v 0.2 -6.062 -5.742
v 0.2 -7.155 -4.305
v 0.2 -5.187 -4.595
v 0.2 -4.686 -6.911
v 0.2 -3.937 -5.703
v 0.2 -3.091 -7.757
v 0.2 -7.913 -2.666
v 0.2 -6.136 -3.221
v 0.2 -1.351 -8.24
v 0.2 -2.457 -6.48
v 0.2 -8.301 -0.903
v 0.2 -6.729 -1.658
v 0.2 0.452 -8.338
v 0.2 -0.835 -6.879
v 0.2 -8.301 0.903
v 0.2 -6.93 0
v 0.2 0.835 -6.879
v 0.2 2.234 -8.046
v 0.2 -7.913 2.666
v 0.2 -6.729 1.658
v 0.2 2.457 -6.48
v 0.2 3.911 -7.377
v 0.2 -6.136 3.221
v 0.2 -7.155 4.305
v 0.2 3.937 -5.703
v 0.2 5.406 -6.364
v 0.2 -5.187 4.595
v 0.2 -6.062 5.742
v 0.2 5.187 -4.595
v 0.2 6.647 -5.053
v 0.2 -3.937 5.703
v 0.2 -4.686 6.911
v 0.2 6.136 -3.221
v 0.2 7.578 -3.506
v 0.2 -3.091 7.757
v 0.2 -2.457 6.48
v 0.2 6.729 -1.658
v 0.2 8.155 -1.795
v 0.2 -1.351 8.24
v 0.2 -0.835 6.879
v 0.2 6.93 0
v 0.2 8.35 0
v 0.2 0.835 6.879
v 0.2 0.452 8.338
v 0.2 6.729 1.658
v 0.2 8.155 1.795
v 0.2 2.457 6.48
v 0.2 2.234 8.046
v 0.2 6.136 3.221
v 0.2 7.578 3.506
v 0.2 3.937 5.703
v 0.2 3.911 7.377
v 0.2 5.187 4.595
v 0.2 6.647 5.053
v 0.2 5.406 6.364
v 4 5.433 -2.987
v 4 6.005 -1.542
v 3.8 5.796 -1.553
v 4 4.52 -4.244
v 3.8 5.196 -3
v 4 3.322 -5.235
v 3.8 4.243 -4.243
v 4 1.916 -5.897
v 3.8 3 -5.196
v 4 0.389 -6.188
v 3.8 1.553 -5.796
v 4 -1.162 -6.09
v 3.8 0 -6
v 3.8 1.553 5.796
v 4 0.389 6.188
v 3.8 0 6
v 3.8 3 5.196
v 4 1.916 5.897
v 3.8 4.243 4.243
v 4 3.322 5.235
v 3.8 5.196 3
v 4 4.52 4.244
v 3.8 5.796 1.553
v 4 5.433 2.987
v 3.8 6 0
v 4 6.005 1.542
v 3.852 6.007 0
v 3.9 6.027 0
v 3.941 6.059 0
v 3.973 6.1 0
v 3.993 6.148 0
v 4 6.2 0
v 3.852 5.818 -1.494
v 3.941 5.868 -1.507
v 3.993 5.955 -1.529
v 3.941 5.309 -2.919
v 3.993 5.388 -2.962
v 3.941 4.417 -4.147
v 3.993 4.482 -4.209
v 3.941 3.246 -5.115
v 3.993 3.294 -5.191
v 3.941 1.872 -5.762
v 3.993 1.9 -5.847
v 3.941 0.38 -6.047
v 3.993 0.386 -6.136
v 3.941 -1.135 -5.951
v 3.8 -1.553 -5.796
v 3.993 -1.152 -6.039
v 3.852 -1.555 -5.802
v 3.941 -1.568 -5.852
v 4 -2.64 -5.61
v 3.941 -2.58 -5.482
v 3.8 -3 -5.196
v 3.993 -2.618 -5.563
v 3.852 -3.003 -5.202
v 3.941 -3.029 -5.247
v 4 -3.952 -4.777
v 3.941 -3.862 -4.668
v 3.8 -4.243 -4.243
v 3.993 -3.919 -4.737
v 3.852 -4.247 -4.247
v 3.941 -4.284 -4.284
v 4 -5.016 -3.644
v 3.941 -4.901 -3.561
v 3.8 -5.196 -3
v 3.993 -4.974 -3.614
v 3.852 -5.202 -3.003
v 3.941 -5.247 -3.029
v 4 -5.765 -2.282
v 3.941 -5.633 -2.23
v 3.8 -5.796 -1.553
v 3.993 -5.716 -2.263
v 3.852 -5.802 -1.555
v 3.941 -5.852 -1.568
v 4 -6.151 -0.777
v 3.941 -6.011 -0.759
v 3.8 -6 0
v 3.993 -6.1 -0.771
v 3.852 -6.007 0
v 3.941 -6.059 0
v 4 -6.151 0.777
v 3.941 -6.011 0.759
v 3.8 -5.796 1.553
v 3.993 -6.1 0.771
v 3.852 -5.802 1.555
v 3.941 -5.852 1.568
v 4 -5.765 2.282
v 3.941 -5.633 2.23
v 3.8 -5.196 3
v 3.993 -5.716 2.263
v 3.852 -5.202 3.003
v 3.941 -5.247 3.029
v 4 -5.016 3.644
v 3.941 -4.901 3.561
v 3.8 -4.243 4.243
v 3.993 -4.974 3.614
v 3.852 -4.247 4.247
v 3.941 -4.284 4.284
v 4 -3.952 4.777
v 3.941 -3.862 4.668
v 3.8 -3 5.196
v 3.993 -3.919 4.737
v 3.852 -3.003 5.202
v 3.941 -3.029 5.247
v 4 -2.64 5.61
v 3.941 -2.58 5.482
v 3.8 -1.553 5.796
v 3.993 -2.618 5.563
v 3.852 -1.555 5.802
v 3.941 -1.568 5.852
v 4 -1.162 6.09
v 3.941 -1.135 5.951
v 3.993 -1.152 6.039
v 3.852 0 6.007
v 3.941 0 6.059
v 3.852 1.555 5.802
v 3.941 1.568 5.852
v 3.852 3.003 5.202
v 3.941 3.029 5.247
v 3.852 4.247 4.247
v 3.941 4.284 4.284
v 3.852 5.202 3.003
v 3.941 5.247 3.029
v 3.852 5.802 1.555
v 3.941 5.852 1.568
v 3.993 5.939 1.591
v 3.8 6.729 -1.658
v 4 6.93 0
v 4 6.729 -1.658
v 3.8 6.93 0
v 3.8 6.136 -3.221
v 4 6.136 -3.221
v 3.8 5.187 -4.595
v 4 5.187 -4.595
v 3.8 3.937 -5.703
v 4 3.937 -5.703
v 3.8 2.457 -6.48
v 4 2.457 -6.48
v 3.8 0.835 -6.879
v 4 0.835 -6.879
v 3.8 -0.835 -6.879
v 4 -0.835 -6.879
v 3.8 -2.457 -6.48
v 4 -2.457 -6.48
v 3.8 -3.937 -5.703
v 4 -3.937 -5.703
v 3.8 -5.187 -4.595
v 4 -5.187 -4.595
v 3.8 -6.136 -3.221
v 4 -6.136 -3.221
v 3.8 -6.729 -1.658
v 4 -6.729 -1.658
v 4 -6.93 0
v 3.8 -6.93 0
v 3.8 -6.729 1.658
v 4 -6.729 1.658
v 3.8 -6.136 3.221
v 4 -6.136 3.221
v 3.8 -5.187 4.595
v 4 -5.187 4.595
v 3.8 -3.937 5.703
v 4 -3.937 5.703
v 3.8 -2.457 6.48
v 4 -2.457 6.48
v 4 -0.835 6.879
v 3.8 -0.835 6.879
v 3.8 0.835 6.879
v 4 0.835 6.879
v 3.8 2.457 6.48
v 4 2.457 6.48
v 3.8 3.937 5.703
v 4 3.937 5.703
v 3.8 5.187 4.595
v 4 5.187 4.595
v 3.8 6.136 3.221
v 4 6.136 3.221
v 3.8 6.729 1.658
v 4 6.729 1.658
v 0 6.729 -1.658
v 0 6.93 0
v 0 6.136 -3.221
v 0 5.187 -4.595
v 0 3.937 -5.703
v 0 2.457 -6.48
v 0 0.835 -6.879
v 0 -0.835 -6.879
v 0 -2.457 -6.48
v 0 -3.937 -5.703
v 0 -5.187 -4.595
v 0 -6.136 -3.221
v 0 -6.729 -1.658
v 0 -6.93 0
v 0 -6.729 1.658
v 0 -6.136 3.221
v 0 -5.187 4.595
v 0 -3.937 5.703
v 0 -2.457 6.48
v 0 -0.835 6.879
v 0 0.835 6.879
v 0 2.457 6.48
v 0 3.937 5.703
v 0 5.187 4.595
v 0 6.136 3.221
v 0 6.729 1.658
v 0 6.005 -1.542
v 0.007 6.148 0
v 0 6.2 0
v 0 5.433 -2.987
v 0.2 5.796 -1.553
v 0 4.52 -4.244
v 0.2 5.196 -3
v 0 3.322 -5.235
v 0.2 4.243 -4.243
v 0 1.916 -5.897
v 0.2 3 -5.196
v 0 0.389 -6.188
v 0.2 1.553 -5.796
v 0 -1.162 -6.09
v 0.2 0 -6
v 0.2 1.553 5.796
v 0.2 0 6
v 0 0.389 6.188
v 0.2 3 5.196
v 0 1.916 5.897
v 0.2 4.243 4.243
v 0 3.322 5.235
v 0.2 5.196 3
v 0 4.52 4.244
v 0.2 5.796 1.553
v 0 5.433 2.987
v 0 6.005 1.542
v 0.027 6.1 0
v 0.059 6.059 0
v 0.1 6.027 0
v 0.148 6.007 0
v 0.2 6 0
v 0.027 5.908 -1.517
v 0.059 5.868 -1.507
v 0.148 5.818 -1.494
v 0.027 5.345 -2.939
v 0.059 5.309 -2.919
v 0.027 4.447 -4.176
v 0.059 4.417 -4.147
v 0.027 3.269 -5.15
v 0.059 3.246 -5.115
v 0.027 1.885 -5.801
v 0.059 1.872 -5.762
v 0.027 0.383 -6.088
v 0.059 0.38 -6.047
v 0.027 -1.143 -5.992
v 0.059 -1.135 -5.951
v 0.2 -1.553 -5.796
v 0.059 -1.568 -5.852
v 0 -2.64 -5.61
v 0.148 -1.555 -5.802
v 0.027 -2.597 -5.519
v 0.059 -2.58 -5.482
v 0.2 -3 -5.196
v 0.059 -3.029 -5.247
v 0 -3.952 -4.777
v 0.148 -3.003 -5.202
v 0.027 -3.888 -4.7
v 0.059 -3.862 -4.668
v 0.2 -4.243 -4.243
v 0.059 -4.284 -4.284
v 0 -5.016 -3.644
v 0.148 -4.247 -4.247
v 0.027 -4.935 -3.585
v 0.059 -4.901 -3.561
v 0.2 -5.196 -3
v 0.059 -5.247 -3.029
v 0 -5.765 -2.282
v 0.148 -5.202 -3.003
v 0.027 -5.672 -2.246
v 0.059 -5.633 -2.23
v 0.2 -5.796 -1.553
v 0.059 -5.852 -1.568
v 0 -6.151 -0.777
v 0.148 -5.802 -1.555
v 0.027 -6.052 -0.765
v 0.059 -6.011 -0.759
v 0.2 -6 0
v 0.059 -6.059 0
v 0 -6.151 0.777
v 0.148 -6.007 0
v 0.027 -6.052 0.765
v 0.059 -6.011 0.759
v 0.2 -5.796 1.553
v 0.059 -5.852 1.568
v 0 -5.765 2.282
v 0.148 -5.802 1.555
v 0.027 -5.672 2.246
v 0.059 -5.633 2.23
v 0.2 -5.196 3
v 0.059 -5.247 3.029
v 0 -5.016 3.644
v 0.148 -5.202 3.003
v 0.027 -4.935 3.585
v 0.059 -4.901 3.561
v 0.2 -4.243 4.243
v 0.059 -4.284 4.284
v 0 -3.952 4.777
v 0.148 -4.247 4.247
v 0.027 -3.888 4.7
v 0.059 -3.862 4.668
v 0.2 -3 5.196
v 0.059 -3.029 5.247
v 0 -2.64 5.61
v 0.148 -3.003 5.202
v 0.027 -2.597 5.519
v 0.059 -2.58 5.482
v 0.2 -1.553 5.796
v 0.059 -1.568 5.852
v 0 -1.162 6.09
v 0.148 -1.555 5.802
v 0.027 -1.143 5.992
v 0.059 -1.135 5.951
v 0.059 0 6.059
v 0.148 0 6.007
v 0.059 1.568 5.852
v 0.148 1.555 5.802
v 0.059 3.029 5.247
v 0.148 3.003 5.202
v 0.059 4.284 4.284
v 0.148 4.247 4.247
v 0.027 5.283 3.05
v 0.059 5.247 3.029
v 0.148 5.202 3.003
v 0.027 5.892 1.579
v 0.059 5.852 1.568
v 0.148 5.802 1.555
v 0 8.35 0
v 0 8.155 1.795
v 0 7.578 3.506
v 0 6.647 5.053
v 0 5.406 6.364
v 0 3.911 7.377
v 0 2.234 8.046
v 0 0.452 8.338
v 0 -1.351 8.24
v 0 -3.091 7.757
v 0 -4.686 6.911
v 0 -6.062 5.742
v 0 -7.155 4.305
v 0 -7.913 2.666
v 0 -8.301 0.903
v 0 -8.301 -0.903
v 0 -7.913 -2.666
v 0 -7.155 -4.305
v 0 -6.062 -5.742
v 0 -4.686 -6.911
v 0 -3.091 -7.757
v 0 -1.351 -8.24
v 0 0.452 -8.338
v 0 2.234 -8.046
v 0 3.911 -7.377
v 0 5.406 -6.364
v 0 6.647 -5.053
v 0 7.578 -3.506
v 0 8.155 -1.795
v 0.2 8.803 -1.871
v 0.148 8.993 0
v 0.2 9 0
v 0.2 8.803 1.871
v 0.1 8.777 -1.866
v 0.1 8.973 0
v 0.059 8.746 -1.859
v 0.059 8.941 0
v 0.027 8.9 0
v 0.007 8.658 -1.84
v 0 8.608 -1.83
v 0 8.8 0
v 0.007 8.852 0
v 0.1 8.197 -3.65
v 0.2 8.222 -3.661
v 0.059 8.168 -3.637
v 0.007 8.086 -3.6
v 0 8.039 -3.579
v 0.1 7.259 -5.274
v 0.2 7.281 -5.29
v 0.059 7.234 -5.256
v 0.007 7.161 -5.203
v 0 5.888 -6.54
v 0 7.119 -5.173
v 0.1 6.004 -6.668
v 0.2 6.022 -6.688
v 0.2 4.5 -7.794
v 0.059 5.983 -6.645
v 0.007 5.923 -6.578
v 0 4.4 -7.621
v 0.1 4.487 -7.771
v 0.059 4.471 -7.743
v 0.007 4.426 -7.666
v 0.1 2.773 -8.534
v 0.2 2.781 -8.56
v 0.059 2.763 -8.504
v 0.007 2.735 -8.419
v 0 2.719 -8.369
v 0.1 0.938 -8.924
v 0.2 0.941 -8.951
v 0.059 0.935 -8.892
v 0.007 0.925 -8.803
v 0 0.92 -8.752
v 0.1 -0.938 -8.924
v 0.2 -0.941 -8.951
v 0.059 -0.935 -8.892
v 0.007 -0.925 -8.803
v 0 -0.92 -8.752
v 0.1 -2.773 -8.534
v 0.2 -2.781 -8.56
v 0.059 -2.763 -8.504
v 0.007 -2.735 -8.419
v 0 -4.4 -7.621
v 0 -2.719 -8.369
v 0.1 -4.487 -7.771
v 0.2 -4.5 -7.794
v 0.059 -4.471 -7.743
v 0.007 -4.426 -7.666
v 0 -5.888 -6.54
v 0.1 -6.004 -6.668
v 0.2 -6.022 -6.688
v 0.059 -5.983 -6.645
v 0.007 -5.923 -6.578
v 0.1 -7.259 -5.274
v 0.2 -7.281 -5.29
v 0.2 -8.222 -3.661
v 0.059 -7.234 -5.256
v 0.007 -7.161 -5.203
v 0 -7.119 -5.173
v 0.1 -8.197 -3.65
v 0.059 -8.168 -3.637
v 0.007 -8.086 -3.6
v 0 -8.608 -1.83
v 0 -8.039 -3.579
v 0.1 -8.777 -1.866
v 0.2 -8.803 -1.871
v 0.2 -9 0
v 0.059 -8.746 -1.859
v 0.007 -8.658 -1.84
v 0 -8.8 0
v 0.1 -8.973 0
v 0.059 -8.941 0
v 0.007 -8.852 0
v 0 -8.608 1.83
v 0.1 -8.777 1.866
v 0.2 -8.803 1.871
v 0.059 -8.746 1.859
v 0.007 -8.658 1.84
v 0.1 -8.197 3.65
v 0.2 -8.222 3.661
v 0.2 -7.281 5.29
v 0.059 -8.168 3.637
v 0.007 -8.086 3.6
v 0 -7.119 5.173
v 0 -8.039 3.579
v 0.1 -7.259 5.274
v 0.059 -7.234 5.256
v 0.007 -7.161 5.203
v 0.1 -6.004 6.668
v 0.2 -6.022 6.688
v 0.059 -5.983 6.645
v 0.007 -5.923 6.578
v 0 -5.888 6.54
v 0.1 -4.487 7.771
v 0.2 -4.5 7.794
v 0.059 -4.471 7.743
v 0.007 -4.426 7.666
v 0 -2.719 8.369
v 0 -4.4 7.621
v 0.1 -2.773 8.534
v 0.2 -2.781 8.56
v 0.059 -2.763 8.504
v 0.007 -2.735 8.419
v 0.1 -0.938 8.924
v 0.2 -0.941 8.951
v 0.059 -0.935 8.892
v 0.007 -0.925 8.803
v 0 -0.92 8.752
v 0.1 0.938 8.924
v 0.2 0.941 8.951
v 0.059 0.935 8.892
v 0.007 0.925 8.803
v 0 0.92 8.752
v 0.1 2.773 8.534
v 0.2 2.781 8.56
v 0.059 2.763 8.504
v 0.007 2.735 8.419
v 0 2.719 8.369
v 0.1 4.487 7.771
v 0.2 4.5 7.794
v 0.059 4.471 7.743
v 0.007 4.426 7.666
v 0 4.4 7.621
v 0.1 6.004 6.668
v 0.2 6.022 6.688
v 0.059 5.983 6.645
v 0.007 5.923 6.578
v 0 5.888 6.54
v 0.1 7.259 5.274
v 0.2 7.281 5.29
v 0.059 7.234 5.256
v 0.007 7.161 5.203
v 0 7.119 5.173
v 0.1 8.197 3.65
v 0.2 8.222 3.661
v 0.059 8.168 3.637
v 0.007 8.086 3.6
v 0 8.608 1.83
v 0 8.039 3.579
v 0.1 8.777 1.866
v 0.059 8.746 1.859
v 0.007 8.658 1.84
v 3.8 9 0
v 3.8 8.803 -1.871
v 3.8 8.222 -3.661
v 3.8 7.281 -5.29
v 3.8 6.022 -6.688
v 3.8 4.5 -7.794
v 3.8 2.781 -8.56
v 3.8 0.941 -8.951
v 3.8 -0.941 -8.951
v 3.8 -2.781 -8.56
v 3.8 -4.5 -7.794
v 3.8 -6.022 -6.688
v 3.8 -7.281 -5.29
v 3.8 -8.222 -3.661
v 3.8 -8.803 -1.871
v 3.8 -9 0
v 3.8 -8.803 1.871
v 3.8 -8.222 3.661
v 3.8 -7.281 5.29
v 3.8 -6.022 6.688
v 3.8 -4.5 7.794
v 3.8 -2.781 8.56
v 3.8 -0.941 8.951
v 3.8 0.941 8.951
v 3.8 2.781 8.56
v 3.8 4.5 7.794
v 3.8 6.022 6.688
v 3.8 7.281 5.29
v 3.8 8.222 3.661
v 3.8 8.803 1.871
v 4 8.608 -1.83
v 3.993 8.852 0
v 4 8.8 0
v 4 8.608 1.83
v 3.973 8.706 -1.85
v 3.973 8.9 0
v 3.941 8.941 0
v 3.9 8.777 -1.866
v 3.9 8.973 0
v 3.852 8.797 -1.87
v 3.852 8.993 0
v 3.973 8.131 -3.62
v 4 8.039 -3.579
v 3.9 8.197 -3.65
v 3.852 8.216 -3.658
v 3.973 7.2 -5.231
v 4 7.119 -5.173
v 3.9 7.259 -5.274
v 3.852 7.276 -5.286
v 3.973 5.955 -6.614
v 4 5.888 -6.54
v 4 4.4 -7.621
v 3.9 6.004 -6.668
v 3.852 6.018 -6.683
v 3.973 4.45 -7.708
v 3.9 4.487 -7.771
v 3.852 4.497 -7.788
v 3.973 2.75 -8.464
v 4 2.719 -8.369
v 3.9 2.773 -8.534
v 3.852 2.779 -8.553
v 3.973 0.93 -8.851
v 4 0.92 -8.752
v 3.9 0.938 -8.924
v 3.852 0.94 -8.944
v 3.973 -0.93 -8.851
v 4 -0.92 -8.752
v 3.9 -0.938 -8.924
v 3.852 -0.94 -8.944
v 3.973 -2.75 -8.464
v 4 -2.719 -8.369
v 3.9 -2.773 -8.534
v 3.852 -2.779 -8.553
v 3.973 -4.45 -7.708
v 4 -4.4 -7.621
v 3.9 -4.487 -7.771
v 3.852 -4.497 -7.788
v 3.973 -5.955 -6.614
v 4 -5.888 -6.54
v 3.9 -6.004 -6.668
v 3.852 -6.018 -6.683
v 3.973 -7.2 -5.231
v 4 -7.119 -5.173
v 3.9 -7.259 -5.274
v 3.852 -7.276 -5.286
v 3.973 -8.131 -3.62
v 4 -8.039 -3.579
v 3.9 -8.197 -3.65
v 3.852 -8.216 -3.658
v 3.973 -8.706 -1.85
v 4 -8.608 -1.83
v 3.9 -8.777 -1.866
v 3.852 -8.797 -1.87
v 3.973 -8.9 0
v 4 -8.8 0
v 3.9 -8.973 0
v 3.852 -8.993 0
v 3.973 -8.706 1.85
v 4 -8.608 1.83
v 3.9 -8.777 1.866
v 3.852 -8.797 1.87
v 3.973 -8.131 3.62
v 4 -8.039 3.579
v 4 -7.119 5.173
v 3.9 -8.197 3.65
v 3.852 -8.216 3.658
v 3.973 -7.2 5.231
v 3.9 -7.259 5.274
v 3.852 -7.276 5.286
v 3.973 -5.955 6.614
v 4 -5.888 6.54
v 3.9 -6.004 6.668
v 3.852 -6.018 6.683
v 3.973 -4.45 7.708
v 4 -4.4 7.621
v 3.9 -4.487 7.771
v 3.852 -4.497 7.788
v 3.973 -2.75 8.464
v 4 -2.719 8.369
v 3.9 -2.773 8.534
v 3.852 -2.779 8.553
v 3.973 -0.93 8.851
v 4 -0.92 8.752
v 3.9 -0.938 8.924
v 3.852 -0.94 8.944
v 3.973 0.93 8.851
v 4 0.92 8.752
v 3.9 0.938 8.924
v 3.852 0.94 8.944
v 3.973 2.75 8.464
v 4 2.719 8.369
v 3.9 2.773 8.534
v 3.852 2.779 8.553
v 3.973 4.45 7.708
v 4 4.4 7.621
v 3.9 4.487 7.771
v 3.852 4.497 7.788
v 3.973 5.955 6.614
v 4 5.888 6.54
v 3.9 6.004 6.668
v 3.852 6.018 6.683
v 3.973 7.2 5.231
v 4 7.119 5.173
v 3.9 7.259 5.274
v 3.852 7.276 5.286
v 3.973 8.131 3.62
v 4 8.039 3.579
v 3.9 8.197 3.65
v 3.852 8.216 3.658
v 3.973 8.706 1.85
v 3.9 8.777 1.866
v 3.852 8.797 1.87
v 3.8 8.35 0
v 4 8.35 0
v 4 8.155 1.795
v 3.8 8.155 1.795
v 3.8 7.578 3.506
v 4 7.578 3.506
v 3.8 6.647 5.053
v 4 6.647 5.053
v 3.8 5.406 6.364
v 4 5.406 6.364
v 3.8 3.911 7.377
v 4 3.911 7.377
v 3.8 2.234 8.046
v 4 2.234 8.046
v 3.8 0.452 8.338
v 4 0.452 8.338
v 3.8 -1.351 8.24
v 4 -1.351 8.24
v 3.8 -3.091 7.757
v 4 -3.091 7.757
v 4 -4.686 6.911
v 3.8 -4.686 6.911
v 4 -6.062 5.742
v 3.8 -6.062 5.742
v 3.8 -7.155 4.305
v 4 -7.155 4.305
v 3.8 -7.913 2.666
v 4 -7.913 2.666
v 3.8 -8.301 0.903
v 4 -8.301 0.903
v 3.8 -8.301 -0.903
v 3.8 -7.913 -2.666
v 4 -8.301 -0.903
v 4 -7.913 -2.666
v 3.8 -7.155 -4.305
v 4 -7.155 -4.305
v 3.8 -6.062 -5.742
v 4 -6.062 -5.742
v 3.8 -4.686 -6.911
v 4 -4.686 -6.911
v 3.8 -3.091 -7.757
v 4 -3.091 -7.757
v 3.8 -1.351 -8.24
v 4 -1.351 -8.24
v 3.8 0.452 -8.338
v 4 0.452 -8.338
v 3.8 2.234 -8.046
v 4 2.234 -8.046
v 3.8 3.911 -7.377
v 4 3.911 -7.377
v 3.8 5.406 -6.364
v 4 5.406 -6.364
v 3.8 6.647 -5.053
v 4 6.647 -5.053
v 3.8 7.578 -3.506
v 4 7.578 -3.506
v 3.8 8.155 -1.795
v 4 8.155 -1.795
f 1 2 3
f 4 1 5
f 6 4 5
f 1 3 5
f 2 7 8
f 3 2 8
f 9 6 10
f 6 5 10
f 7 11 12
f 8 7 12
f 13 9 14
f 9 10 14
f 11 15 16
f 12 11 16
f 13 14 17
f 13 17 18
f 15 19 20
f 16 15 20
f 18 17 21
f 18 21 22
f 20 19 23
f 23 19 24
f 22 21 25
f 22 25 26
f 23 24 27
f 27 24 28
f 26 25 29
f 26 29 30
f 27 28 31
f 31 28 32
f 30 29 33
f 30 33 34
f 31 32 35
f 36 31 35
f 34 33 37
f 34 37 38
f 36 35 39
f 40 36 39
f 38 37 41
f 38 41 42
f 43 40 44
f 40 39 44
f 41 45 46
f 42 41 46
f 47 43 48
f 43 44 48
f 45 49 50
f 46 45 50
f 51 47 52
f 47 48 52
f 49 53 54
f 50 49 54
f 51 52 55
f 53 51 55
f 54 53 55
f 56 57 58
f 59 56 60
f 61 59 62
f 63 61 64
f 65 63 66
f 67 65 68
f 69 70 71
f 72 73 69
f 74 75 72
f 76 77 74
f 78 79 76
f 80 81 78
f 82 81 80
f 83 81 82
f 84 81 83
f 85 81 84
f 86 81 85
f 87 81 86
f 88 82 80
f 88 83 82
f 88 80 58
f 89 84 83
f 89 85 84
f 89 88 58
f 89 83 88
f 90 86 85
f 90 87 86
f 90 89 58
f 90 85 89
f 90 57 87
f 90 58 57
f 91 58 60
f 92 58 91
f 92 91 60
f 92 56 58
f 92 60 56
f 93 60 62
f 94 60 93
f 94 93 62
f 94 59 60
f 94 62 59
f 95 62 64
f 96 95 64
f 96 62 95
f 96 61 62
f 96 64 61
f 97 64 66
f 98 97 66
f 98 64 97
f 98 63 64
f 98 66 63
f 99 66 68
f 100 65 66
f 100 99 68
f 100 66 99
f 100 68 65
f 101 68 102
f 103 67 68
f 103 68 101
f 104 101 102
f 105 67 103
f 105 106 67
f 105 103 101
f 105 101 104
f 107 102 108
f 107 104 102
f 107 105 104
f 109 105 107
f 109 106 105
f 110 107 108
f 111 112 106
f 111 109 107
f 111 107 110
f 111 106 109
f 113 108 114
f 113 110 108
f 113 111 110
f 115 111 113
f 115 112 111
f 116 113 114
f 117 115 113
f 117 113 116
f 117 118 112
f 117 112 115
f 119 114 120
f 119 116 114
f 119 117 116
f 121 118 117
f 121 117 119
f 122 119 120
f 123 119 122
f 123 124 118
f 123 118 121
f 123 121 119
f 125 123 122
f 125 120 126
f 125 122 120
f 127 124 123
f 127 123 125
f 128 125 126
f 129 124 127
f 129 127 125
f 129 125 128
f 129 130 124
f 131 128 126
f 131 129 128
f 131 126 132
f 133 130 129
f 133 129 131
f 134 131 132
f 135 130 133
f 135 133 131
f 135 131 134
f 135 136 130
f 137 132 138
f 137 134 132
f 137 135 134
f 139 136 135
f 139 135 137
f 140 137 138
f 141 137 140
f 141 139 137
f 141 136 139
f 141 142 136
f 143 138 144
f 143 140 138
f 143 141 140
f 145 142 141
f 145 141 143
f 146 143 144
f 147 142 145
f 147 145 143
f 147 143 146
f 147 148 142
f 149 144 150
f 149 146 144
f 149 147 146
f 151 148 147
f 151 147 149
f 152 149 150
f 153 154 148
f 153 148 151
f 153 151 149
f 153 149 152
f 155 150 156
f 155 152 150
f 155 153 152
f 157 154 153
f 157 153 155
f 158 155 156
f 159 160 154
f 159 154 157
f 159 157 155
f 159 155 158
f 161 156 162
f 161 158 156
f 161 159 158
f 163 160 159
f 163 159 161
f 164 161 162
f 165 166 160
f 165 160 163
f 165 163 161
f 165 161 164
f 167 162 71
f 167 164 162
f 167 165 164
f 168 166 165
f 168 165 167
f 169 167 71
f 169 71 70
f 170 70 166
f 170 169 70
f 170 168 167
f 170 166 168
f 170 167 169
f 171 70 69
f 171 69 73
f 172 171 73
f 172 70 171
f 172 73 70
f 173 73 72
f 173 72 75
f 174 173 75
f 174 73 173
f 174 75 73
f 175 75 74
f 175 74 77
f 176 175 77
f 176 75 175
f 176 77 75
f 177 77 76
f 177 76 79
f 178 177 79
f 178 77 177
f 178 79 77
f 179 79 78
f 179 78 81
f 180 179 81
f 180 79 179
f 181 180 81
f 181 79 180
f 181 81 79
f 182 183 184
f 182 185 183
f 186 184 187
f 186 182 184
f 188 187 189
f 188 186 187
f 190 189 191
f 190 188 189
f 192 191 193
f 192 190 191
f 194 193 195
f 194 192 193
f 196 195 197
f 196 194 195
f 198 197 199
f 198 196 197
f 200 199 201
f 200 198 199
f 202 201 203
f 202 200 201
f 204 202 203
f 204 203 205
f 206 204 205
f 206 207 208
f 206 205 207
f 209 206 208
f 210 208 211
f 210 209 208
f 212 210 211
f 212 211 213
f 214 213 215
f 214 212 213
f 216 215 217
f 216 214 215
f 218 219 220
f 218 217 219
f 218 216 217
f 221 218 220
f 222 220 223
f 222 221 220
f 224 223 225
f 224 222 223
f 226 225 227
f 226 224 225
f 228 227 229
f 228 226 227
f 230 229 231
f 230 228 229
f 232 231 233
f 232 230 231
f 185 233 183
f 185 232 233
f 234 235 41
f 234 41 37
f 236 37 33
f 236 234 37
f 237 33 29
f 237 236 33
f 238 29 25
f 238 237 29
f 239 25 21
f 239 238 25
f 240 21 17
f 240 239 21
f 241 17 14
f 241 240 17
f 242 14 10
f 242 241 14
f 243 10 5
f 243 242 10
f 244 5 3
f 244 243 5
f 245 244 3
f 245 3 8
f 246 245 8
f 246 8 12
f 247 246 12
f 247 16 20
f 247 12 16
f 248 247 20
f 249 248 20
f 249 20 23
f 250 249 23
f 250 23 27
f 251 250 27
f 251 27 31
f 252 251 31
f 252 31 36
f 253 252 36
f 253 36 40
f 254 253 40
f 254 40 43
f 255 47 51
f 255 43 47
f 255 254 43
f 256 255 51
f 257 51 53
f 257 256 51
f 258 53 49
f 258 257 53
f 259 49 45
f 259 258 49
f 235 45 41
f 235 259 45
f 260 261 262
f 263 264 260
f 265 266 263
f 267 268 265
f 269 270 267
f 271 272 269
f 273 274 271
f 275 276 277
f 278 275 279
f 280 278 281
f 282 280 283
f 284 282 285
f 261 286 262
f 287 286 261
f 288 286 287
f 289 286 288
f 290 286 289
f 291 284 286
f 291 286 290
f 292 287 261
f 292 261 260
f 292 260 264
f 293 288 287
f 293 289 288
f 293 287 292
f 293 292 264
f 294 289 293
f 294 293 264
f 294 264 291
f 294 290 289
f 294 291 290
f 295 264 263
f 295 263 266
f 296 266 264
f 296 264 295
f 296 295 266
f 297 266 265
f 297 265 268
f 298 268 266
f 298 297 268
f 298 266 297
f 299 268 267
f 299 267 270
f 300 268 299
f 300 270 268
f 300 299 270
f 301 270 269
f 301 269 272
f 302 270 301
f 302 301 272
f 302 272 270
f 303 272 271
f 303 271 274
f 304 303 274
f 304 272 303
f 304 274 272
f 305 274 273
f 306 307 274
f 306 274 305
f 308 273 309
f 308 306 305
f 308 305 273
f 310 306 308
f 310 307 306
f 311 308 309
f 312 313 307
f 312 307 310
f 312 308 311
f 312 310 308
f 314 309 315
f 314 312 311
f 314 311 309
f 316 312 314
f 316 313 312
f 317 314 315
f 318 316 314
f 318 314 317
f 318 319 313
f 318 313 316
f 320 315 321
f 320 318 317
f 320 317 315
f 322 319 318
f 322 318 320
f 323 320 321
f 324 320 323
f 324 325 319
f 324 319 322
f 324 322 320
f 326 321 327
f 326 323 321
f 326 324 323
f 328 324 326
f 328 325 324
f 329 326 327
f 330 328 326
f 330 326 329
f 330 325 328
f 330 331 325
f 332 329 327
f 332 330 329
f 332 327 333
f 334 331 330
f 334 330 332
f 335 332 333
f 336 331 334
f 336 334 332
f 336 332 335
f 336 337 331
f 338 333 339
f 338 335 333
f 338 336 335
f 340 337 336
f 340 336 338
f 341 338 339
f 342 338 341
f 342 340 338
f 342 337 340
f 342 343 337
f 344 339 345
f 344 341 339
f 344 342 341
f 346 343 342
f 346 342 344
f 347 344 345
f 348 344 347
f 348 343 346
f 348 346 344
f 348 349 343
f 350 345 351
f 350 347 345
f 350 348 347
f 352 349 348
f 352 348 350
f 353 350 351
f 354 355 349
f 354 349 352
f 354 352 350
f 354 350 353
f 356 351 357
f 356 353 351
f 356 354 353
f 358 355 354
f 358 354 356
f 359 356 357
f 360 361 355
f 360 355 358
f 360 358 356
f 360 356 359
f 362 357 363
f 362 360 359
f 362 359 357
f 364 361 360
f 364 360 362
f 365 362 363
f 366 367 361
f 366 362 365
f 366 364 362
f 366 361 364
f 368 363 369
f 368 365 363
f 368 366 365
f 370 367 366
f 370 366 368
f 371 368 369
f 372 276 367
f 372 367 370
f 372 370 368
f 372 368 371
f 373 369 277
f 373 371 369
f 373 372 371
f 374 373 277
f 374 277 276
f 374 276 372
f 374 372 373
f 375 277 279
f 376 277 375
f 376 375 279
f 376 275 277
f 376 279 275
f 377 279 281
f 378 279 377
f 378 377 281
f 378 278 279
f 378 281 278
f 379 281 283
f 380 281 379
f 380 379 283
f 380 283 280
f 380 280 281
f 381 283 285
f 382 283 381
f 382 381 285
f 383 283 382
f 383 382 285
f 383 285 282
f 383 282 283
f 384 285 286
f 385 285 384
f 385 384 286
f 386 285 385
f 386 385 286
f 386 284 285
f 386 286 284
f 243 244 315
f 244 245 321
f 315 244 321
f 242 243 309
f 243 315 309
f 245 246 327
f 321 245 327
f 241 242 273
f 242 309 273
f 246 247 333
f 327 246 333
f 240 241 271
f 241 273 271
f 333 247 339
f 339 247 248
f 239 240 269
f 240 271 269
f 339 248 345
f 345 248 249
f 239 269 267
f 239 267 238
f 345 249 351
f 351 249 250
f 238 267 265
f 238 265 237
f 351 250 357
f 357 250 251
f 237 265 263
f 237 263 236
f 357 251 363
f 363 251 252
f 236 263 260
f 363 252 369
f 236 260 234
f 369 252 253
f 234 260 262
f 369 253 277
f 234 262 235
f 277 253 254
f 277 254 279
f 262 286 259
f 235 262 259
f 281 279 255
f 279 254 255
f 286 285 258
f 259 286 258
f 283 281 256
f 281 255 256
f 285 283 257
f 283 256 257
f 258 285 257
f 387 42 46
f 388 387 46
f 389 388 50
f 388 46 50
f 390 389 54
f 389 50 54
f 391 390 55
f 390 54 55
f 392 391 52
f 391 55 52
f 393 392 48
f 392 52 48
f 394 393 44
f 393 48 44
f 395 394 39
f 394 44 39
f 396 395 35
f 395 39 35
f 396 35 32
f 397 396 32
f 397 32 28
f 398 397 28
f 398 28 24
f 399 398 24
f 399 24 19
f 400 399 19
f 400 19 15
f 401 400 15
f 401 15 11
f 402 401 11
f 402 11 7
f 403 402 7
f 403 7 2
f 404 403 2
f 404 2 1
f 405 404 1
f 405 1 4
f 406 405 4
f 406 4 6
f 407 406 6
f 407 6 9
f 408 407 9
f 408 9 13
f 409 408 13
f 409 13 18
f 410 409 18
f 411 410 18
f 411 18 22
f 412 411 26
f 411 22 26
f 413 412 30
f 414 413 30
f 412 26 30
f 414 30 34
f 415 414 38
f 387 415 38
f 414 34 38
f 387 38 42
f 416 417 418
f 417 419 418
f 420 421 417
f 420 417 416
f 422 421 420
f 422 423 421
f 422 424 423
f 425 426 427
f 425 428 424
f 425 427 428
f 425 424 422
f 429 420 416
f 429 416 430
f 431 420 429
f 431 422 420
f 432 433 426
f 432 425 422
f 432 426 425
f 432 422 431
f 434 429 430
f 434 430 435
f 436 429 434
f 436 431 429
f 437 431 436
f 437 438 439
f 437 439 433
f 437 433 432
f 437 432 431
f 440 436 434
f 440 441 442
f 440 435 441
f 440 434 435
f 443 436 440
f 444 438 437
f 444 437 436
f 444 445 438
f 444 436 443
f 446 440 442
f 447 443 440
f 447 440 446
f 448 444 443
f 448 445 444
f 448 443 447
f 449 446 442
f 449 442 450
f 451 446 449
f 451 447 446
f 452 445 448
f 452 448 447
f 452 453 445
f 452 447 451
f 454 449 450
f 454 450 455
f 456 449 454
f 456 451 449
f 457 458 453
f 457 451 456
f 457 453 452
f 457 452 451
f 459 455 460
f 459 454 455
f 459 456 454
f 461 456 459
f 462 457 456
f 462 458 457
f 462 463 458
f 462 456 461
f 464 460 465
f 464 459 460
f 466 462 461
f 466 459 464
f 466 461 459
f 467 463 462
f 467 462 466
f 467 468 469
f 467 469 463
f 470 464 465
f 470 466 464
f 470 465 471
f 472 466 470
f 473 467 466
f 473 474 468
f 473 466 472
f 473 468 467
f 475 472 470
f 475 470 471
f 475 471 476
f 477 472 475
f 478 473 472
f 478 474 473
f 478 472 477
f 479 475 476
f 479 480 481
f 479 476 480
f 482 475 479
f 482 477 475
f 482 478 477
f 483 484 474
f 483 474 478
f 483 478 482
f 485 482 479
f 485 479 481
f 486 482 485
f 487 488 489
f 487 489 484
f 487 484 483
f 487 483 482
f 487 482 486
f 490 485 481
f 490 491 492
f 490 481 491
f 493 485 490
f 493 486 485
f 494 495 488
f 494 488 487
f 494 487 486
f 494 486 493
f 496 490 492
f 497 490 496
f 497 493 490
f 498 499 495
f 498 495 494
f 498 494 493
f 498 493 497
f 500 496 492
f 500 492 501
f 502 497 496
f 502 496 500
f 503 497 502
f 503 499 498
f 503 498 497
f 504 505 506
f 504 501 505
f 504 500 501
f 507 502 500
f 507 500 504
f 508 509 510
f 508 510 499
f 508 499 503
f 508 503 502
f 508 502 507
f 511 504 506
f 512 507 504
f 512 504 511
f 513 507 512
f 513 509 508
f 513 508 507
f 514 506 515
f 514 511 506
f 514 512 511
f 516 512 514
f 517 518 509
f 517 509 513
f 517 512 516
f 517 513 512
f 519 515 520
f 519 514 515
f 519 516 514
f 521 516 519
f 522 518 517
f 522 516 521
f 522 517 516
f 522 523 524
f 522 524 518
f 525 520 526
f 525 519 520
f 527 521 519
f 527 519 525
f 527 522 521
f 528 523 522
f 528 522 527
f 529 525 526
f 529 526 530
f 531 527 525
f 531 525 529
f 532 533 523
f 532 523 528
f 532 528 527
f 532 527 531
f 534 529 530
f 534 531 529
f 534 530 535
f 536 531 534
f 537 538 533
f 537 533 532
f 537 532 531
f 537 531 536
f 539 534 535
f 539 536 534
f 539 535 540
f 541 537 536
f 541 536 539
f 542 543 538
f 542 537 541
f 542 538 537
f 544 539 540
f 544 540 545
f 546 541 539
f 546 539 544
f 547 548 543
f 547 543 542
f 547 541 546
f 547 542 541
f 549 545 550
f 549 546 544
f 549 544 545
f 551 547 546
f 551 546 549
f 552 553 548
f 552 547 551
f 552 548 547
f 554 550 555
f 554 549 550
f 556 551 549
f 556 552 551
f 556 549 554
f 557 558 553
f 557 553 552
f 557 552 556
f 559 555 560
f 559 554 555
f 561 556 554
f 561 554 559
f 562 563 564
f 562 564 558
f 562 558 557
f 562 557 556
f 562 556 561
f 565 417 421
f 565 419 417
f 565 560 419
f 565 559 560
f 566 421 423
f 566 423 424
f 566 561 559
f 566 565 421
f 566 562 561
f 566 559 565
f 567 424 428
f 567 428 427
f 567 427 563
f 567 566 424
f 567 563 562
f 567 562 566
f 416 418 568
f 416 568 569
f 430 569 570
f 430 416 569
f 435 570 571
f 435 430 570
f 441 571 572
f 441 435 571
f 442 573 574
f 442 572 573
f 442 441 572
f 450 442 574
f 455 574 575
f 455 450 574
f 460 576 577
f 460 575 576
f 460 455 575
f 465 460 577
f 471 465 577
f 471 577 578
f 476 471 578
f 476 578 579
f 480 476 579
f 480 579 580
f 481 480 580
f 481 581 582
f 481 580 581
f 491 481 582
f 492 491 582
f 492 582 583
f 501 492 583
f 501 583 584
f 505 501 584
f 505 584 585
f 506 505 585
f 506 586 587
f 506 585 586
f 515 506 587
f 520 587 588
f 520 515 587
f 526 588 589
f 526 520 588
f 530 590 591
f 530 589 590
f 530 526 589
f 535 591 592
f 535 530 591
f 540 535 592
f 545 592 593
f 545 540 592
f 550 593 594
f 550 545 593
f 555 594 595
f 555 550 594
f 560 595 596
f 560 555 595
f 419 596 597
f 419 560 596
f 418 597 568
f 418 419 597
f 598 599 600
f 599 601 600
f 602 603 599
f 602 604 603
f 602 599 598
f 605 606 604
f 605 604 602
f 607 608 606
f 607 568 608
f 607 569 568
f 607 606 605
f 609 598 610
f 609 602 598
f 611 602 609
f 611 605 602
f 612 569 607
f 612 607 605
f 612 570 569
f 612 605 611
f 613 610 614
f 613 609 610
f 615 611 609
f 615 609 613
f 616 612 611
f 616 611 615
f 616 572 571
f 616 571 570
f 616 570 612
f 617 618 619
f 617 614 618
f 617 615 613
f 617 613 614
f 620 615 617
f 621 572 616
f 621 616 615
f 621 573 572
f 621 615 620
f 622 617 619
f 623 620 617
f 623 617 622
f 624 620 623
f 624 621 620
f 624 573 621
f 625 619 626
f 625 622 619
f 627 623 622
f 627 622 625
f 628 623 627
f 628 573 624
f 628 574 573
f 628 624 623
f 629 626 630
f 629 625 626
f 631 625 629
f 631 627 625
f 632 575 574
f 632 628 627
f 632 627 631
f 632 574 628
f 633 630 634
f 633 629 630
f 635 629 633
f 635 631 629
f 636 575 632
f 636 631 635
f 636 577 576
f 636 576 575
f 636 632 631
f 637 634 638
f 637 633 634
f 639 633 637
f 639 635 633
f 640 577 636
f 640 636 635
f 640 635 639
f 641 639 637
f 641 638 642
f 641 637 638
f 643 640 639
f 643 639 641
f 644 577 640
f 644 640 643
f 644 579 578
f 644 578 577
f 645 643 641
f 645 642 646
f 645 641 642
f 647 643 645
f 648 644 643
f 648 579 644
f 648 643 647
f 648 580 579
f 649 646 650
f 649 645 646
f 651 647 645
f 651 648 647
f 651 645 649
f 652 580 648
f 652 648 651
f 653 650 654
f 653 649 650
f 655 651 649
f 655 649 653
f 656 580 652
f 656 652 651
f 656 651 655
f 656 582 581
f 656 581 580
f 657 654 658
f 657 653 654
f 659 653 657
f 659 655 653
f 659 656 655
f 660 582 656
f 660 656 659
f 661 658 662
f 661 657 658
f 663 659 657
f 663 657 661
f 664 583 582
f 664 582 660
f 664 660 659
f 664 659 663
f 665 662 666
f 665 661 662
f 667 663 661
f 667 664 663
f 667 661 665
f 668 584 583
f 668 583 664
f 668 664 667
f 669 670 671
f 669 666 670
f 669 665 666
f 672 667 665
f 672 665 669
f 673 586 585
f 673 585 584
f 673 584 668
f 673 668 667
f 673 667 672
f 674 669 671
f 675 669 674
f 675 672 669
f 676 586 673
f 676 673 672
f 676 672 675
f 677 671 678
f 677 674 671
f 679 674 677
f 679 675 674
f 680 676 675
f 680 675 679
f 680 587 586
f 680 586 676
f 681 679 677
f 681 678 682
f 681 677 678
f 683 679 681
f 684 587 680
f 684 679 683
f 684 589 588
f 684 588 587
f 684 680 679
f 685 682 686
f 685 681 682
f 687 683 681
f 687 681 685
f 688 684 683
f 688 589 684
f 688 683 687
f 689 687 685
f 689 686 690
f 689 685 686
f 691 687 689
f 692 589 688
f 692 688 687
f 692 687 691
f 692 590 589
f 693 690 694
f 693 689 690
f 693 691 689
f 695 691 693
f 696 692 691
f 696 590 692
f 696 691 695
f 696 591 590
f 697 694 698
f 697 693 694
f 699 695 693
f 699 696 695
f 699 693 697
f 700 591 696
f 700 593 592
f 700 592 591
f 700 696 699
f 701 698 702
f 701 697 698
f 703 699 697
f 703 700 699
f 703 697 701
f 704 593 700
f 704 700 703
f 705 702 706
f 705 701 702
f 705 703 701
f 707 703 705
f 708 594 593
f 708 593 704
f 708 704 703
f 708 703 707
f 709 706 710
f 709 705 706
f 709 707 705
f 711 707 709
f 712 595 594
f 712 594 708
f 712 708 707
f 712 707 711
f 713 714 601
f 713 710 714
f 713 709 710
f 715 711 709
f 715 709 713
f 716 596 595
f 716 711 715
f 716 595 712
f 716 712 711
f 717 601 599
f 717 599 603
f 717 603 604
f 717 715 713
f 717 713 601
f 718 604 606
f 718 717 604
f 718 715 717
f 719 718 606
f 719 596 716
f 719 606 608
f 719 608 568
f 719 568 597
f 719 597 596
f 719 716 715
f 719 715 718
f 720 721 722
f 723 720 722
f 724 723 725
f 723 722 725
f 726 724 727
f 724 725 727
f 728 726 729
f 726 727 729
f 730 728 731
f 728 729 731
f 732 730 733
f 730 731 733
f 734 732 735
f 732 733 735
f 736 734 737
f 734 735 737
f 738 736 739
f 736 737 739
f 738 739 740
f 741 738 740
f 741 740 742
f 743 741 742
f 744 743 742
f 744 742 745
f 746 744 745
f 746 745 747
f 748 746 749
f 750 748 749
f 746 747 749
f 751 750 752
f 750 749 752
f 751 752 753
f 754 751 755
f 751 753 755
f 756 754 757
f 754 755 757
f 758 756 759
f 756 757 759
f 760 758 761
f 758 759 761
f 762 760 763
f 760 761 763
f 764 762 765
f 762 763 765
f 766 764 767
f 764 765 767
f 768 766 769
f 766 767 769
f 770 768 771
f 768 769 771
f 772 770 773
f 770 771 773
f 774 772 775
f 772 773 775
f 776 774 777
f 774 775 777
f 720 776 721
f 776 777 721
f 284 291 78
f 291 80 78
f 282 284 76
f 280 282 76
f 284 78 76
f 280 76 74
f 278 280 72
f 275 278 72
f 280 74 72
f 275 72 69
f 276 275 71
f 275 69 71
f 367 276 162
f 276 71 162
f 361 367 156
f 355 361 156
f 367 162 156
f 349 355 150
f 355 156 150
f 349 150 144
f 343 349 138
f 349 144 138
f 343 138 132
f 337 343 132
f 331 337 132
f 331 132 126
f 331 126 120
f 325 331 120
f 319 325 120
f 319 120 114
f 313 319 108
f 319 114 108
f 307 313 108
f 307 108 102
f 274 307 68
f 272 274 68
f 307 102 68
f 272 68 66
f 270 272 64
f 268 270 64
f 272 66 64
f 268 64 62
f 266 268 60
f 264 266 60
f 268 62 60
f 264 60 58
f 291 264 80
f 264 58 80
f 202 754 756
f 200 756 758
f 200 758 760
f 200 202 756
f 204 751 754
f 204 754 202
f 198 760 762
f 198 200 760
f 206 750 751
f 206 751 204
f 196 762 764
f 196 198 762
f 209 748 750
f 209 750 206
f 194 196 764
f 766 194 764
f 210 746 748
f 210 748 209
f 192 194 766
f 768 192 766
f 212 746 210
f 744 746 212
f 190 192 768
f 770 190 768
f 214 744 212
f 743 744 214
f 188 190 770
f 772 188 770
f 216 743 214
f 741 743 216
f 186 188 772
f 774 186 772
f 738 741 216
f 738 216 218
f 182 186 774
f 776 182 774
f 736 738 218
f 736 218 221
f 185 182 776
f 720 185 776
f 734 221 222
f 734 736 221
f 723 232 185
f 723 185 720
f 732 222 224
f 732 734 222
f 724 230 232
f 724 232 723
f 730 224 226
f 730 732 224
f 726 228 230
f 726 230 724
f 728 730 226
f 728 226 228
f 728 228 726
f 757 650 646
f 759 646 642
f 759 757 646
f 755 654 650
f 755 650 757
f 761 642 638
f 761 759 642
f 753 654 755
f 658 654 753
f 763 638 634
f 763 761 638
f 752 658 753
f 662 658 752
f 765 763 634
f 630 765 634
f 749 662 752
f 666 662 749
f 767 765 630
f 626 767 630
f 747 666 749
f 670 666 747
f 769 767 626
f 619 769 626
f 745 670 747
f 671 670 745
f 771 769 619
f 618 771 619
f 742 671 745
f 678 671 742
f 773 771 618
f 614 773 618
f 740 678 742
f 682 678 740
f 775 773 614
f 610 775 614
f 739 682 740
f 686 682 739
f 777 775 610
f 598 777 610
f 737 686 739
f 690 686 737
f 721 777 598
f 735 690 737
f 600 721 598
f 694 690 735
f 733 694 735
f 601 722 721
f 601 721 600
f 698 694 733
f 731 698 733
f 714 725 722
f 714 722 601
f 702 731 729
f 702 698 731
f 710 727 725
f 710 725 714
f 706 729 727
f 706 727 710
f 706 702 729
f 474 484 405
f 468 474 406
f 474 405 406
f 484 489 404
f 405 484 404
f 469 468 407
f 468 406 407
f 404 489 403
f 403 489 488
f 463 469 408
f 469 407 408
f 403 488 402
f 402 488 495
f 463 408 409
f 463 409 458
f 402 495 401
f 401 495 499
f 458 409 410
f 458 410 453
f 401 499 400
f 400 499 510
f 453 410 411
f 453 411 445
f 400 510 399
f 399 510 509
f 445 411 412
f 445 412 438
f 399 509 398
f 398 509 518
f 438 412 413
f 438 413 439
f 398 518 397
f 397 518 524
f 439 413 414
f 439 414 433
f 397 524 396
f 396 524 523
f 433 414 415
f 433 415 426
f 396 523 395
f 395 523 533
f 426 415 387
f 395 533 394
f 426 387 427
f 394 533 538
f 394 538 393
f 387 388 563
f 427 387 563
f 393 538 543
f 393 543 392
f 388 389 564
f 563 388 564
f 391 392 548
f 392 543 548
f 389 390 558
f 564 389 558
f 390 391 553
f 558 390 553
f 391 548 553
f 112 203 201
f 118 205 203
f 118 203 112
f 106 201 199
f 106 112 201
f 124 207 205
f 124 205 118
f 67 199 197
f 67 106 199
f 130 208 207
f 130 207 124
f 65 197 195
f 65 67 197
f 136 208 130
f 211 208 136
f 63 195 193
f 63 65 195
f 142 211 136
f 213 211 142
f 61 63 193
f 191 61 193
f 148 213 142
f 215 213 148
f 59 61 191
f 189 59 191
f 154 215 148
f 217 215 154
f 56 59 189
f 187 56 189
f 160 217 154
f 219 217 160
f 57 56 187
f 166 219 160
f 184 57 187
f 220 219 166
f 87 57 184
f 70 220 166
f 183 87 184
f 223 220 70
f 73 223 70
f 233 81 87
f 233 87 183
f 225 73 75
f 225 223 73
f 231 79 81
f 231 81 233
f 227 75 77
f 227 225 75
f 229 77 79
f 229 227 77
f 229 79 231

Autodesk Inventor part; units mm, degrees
sketch "Sketch_1" plane through (0, 0, 0) normal (0, 0, 1) x (1, 0, 0)
  line L0 (4, 0) -> (0, 0)
  arc A0 (0, 6.2) -> (0.2, 6) centre (0.2, 6.2) ccw
  line L1 (0.2, 6) -> (3.8, 6)
  arc A1 (3.8, 6) -> (4, 6.2) centre (3.8, 6.2) ccw
  line L2 (4, 6.2) -> (4, 6.93)
  line L3 (4, 6.93) -> (3.8, 6.93)
  line L4 (3.8, 6.93) -> (3.8, 8.35)
  line L5 (3.8, 8.35) -> (4, 8.35)
  line L6 (4, 8.35) -> (4, 8.8)
  arc A2 (4, 8.8) -> (3.8, 9) centre (3.8, 8.8) ccw
  line L7 (3.8, 9) -> (0.2, 9)
  arc A3 (0.2, 9) -> (0, 8.8) centre (0.2, 8.8) ccw
  line L8 (0, 8.8) -> (0, 8.35)
  line L9 (0, 8.35) -> (0.2, 8.35)
  line L10 (0.2, 8.35) -> (0.2, 6.93)
  line L11 (0.2, 6.93) -> (0, 6.93)
  line L12 (0, 6.93) -> (0, 6.2)
revolve "Revolution1" add sketch "Sketch_1" angle 360 about axis through (4, 0, 0) along (1, 0, 0)
ref_plane "center_point_XY" through (2, 0, 0) normal (1, 0, 0) x (0, 0, -1)
ref_plane "center_point_YZ" through (2, 0, 0) normal (0, 0, -1) x (0, 1, 0)
ref_plane "center_point_ZX" through (2, 0, 0) normal (0, 1, 0) x (1, 0, 0)
ref_plane "to_housing_XY" through (0, 0, 0) normal (1, 0, 0) x (0, 0, -1)
ref_plane "to_housing_YZ" through (0, 0, 0) normal (0, 0, -1) x (0, 1, 0)
ref_plane "to_housing_ZX" through (0, 0, 0) normal (0, 1, 0) x (1, 0, 0)
ref_plane "to_ring_XY" through (3.6, 0, 0) normal (1, 0, 0) x (0, 0, -1)
ref_plane "to_ring_YZ" through (3.6, 0, 0) normal (0, 0, -1) x (0, 1, 0)
ref_plane "to_ring_ZX" through (3.6, 0, 0) normal (0, 1, 0) x (1, 0, 0)
properties part number "B6701ZZ" material "鉄、鋳鉄"
